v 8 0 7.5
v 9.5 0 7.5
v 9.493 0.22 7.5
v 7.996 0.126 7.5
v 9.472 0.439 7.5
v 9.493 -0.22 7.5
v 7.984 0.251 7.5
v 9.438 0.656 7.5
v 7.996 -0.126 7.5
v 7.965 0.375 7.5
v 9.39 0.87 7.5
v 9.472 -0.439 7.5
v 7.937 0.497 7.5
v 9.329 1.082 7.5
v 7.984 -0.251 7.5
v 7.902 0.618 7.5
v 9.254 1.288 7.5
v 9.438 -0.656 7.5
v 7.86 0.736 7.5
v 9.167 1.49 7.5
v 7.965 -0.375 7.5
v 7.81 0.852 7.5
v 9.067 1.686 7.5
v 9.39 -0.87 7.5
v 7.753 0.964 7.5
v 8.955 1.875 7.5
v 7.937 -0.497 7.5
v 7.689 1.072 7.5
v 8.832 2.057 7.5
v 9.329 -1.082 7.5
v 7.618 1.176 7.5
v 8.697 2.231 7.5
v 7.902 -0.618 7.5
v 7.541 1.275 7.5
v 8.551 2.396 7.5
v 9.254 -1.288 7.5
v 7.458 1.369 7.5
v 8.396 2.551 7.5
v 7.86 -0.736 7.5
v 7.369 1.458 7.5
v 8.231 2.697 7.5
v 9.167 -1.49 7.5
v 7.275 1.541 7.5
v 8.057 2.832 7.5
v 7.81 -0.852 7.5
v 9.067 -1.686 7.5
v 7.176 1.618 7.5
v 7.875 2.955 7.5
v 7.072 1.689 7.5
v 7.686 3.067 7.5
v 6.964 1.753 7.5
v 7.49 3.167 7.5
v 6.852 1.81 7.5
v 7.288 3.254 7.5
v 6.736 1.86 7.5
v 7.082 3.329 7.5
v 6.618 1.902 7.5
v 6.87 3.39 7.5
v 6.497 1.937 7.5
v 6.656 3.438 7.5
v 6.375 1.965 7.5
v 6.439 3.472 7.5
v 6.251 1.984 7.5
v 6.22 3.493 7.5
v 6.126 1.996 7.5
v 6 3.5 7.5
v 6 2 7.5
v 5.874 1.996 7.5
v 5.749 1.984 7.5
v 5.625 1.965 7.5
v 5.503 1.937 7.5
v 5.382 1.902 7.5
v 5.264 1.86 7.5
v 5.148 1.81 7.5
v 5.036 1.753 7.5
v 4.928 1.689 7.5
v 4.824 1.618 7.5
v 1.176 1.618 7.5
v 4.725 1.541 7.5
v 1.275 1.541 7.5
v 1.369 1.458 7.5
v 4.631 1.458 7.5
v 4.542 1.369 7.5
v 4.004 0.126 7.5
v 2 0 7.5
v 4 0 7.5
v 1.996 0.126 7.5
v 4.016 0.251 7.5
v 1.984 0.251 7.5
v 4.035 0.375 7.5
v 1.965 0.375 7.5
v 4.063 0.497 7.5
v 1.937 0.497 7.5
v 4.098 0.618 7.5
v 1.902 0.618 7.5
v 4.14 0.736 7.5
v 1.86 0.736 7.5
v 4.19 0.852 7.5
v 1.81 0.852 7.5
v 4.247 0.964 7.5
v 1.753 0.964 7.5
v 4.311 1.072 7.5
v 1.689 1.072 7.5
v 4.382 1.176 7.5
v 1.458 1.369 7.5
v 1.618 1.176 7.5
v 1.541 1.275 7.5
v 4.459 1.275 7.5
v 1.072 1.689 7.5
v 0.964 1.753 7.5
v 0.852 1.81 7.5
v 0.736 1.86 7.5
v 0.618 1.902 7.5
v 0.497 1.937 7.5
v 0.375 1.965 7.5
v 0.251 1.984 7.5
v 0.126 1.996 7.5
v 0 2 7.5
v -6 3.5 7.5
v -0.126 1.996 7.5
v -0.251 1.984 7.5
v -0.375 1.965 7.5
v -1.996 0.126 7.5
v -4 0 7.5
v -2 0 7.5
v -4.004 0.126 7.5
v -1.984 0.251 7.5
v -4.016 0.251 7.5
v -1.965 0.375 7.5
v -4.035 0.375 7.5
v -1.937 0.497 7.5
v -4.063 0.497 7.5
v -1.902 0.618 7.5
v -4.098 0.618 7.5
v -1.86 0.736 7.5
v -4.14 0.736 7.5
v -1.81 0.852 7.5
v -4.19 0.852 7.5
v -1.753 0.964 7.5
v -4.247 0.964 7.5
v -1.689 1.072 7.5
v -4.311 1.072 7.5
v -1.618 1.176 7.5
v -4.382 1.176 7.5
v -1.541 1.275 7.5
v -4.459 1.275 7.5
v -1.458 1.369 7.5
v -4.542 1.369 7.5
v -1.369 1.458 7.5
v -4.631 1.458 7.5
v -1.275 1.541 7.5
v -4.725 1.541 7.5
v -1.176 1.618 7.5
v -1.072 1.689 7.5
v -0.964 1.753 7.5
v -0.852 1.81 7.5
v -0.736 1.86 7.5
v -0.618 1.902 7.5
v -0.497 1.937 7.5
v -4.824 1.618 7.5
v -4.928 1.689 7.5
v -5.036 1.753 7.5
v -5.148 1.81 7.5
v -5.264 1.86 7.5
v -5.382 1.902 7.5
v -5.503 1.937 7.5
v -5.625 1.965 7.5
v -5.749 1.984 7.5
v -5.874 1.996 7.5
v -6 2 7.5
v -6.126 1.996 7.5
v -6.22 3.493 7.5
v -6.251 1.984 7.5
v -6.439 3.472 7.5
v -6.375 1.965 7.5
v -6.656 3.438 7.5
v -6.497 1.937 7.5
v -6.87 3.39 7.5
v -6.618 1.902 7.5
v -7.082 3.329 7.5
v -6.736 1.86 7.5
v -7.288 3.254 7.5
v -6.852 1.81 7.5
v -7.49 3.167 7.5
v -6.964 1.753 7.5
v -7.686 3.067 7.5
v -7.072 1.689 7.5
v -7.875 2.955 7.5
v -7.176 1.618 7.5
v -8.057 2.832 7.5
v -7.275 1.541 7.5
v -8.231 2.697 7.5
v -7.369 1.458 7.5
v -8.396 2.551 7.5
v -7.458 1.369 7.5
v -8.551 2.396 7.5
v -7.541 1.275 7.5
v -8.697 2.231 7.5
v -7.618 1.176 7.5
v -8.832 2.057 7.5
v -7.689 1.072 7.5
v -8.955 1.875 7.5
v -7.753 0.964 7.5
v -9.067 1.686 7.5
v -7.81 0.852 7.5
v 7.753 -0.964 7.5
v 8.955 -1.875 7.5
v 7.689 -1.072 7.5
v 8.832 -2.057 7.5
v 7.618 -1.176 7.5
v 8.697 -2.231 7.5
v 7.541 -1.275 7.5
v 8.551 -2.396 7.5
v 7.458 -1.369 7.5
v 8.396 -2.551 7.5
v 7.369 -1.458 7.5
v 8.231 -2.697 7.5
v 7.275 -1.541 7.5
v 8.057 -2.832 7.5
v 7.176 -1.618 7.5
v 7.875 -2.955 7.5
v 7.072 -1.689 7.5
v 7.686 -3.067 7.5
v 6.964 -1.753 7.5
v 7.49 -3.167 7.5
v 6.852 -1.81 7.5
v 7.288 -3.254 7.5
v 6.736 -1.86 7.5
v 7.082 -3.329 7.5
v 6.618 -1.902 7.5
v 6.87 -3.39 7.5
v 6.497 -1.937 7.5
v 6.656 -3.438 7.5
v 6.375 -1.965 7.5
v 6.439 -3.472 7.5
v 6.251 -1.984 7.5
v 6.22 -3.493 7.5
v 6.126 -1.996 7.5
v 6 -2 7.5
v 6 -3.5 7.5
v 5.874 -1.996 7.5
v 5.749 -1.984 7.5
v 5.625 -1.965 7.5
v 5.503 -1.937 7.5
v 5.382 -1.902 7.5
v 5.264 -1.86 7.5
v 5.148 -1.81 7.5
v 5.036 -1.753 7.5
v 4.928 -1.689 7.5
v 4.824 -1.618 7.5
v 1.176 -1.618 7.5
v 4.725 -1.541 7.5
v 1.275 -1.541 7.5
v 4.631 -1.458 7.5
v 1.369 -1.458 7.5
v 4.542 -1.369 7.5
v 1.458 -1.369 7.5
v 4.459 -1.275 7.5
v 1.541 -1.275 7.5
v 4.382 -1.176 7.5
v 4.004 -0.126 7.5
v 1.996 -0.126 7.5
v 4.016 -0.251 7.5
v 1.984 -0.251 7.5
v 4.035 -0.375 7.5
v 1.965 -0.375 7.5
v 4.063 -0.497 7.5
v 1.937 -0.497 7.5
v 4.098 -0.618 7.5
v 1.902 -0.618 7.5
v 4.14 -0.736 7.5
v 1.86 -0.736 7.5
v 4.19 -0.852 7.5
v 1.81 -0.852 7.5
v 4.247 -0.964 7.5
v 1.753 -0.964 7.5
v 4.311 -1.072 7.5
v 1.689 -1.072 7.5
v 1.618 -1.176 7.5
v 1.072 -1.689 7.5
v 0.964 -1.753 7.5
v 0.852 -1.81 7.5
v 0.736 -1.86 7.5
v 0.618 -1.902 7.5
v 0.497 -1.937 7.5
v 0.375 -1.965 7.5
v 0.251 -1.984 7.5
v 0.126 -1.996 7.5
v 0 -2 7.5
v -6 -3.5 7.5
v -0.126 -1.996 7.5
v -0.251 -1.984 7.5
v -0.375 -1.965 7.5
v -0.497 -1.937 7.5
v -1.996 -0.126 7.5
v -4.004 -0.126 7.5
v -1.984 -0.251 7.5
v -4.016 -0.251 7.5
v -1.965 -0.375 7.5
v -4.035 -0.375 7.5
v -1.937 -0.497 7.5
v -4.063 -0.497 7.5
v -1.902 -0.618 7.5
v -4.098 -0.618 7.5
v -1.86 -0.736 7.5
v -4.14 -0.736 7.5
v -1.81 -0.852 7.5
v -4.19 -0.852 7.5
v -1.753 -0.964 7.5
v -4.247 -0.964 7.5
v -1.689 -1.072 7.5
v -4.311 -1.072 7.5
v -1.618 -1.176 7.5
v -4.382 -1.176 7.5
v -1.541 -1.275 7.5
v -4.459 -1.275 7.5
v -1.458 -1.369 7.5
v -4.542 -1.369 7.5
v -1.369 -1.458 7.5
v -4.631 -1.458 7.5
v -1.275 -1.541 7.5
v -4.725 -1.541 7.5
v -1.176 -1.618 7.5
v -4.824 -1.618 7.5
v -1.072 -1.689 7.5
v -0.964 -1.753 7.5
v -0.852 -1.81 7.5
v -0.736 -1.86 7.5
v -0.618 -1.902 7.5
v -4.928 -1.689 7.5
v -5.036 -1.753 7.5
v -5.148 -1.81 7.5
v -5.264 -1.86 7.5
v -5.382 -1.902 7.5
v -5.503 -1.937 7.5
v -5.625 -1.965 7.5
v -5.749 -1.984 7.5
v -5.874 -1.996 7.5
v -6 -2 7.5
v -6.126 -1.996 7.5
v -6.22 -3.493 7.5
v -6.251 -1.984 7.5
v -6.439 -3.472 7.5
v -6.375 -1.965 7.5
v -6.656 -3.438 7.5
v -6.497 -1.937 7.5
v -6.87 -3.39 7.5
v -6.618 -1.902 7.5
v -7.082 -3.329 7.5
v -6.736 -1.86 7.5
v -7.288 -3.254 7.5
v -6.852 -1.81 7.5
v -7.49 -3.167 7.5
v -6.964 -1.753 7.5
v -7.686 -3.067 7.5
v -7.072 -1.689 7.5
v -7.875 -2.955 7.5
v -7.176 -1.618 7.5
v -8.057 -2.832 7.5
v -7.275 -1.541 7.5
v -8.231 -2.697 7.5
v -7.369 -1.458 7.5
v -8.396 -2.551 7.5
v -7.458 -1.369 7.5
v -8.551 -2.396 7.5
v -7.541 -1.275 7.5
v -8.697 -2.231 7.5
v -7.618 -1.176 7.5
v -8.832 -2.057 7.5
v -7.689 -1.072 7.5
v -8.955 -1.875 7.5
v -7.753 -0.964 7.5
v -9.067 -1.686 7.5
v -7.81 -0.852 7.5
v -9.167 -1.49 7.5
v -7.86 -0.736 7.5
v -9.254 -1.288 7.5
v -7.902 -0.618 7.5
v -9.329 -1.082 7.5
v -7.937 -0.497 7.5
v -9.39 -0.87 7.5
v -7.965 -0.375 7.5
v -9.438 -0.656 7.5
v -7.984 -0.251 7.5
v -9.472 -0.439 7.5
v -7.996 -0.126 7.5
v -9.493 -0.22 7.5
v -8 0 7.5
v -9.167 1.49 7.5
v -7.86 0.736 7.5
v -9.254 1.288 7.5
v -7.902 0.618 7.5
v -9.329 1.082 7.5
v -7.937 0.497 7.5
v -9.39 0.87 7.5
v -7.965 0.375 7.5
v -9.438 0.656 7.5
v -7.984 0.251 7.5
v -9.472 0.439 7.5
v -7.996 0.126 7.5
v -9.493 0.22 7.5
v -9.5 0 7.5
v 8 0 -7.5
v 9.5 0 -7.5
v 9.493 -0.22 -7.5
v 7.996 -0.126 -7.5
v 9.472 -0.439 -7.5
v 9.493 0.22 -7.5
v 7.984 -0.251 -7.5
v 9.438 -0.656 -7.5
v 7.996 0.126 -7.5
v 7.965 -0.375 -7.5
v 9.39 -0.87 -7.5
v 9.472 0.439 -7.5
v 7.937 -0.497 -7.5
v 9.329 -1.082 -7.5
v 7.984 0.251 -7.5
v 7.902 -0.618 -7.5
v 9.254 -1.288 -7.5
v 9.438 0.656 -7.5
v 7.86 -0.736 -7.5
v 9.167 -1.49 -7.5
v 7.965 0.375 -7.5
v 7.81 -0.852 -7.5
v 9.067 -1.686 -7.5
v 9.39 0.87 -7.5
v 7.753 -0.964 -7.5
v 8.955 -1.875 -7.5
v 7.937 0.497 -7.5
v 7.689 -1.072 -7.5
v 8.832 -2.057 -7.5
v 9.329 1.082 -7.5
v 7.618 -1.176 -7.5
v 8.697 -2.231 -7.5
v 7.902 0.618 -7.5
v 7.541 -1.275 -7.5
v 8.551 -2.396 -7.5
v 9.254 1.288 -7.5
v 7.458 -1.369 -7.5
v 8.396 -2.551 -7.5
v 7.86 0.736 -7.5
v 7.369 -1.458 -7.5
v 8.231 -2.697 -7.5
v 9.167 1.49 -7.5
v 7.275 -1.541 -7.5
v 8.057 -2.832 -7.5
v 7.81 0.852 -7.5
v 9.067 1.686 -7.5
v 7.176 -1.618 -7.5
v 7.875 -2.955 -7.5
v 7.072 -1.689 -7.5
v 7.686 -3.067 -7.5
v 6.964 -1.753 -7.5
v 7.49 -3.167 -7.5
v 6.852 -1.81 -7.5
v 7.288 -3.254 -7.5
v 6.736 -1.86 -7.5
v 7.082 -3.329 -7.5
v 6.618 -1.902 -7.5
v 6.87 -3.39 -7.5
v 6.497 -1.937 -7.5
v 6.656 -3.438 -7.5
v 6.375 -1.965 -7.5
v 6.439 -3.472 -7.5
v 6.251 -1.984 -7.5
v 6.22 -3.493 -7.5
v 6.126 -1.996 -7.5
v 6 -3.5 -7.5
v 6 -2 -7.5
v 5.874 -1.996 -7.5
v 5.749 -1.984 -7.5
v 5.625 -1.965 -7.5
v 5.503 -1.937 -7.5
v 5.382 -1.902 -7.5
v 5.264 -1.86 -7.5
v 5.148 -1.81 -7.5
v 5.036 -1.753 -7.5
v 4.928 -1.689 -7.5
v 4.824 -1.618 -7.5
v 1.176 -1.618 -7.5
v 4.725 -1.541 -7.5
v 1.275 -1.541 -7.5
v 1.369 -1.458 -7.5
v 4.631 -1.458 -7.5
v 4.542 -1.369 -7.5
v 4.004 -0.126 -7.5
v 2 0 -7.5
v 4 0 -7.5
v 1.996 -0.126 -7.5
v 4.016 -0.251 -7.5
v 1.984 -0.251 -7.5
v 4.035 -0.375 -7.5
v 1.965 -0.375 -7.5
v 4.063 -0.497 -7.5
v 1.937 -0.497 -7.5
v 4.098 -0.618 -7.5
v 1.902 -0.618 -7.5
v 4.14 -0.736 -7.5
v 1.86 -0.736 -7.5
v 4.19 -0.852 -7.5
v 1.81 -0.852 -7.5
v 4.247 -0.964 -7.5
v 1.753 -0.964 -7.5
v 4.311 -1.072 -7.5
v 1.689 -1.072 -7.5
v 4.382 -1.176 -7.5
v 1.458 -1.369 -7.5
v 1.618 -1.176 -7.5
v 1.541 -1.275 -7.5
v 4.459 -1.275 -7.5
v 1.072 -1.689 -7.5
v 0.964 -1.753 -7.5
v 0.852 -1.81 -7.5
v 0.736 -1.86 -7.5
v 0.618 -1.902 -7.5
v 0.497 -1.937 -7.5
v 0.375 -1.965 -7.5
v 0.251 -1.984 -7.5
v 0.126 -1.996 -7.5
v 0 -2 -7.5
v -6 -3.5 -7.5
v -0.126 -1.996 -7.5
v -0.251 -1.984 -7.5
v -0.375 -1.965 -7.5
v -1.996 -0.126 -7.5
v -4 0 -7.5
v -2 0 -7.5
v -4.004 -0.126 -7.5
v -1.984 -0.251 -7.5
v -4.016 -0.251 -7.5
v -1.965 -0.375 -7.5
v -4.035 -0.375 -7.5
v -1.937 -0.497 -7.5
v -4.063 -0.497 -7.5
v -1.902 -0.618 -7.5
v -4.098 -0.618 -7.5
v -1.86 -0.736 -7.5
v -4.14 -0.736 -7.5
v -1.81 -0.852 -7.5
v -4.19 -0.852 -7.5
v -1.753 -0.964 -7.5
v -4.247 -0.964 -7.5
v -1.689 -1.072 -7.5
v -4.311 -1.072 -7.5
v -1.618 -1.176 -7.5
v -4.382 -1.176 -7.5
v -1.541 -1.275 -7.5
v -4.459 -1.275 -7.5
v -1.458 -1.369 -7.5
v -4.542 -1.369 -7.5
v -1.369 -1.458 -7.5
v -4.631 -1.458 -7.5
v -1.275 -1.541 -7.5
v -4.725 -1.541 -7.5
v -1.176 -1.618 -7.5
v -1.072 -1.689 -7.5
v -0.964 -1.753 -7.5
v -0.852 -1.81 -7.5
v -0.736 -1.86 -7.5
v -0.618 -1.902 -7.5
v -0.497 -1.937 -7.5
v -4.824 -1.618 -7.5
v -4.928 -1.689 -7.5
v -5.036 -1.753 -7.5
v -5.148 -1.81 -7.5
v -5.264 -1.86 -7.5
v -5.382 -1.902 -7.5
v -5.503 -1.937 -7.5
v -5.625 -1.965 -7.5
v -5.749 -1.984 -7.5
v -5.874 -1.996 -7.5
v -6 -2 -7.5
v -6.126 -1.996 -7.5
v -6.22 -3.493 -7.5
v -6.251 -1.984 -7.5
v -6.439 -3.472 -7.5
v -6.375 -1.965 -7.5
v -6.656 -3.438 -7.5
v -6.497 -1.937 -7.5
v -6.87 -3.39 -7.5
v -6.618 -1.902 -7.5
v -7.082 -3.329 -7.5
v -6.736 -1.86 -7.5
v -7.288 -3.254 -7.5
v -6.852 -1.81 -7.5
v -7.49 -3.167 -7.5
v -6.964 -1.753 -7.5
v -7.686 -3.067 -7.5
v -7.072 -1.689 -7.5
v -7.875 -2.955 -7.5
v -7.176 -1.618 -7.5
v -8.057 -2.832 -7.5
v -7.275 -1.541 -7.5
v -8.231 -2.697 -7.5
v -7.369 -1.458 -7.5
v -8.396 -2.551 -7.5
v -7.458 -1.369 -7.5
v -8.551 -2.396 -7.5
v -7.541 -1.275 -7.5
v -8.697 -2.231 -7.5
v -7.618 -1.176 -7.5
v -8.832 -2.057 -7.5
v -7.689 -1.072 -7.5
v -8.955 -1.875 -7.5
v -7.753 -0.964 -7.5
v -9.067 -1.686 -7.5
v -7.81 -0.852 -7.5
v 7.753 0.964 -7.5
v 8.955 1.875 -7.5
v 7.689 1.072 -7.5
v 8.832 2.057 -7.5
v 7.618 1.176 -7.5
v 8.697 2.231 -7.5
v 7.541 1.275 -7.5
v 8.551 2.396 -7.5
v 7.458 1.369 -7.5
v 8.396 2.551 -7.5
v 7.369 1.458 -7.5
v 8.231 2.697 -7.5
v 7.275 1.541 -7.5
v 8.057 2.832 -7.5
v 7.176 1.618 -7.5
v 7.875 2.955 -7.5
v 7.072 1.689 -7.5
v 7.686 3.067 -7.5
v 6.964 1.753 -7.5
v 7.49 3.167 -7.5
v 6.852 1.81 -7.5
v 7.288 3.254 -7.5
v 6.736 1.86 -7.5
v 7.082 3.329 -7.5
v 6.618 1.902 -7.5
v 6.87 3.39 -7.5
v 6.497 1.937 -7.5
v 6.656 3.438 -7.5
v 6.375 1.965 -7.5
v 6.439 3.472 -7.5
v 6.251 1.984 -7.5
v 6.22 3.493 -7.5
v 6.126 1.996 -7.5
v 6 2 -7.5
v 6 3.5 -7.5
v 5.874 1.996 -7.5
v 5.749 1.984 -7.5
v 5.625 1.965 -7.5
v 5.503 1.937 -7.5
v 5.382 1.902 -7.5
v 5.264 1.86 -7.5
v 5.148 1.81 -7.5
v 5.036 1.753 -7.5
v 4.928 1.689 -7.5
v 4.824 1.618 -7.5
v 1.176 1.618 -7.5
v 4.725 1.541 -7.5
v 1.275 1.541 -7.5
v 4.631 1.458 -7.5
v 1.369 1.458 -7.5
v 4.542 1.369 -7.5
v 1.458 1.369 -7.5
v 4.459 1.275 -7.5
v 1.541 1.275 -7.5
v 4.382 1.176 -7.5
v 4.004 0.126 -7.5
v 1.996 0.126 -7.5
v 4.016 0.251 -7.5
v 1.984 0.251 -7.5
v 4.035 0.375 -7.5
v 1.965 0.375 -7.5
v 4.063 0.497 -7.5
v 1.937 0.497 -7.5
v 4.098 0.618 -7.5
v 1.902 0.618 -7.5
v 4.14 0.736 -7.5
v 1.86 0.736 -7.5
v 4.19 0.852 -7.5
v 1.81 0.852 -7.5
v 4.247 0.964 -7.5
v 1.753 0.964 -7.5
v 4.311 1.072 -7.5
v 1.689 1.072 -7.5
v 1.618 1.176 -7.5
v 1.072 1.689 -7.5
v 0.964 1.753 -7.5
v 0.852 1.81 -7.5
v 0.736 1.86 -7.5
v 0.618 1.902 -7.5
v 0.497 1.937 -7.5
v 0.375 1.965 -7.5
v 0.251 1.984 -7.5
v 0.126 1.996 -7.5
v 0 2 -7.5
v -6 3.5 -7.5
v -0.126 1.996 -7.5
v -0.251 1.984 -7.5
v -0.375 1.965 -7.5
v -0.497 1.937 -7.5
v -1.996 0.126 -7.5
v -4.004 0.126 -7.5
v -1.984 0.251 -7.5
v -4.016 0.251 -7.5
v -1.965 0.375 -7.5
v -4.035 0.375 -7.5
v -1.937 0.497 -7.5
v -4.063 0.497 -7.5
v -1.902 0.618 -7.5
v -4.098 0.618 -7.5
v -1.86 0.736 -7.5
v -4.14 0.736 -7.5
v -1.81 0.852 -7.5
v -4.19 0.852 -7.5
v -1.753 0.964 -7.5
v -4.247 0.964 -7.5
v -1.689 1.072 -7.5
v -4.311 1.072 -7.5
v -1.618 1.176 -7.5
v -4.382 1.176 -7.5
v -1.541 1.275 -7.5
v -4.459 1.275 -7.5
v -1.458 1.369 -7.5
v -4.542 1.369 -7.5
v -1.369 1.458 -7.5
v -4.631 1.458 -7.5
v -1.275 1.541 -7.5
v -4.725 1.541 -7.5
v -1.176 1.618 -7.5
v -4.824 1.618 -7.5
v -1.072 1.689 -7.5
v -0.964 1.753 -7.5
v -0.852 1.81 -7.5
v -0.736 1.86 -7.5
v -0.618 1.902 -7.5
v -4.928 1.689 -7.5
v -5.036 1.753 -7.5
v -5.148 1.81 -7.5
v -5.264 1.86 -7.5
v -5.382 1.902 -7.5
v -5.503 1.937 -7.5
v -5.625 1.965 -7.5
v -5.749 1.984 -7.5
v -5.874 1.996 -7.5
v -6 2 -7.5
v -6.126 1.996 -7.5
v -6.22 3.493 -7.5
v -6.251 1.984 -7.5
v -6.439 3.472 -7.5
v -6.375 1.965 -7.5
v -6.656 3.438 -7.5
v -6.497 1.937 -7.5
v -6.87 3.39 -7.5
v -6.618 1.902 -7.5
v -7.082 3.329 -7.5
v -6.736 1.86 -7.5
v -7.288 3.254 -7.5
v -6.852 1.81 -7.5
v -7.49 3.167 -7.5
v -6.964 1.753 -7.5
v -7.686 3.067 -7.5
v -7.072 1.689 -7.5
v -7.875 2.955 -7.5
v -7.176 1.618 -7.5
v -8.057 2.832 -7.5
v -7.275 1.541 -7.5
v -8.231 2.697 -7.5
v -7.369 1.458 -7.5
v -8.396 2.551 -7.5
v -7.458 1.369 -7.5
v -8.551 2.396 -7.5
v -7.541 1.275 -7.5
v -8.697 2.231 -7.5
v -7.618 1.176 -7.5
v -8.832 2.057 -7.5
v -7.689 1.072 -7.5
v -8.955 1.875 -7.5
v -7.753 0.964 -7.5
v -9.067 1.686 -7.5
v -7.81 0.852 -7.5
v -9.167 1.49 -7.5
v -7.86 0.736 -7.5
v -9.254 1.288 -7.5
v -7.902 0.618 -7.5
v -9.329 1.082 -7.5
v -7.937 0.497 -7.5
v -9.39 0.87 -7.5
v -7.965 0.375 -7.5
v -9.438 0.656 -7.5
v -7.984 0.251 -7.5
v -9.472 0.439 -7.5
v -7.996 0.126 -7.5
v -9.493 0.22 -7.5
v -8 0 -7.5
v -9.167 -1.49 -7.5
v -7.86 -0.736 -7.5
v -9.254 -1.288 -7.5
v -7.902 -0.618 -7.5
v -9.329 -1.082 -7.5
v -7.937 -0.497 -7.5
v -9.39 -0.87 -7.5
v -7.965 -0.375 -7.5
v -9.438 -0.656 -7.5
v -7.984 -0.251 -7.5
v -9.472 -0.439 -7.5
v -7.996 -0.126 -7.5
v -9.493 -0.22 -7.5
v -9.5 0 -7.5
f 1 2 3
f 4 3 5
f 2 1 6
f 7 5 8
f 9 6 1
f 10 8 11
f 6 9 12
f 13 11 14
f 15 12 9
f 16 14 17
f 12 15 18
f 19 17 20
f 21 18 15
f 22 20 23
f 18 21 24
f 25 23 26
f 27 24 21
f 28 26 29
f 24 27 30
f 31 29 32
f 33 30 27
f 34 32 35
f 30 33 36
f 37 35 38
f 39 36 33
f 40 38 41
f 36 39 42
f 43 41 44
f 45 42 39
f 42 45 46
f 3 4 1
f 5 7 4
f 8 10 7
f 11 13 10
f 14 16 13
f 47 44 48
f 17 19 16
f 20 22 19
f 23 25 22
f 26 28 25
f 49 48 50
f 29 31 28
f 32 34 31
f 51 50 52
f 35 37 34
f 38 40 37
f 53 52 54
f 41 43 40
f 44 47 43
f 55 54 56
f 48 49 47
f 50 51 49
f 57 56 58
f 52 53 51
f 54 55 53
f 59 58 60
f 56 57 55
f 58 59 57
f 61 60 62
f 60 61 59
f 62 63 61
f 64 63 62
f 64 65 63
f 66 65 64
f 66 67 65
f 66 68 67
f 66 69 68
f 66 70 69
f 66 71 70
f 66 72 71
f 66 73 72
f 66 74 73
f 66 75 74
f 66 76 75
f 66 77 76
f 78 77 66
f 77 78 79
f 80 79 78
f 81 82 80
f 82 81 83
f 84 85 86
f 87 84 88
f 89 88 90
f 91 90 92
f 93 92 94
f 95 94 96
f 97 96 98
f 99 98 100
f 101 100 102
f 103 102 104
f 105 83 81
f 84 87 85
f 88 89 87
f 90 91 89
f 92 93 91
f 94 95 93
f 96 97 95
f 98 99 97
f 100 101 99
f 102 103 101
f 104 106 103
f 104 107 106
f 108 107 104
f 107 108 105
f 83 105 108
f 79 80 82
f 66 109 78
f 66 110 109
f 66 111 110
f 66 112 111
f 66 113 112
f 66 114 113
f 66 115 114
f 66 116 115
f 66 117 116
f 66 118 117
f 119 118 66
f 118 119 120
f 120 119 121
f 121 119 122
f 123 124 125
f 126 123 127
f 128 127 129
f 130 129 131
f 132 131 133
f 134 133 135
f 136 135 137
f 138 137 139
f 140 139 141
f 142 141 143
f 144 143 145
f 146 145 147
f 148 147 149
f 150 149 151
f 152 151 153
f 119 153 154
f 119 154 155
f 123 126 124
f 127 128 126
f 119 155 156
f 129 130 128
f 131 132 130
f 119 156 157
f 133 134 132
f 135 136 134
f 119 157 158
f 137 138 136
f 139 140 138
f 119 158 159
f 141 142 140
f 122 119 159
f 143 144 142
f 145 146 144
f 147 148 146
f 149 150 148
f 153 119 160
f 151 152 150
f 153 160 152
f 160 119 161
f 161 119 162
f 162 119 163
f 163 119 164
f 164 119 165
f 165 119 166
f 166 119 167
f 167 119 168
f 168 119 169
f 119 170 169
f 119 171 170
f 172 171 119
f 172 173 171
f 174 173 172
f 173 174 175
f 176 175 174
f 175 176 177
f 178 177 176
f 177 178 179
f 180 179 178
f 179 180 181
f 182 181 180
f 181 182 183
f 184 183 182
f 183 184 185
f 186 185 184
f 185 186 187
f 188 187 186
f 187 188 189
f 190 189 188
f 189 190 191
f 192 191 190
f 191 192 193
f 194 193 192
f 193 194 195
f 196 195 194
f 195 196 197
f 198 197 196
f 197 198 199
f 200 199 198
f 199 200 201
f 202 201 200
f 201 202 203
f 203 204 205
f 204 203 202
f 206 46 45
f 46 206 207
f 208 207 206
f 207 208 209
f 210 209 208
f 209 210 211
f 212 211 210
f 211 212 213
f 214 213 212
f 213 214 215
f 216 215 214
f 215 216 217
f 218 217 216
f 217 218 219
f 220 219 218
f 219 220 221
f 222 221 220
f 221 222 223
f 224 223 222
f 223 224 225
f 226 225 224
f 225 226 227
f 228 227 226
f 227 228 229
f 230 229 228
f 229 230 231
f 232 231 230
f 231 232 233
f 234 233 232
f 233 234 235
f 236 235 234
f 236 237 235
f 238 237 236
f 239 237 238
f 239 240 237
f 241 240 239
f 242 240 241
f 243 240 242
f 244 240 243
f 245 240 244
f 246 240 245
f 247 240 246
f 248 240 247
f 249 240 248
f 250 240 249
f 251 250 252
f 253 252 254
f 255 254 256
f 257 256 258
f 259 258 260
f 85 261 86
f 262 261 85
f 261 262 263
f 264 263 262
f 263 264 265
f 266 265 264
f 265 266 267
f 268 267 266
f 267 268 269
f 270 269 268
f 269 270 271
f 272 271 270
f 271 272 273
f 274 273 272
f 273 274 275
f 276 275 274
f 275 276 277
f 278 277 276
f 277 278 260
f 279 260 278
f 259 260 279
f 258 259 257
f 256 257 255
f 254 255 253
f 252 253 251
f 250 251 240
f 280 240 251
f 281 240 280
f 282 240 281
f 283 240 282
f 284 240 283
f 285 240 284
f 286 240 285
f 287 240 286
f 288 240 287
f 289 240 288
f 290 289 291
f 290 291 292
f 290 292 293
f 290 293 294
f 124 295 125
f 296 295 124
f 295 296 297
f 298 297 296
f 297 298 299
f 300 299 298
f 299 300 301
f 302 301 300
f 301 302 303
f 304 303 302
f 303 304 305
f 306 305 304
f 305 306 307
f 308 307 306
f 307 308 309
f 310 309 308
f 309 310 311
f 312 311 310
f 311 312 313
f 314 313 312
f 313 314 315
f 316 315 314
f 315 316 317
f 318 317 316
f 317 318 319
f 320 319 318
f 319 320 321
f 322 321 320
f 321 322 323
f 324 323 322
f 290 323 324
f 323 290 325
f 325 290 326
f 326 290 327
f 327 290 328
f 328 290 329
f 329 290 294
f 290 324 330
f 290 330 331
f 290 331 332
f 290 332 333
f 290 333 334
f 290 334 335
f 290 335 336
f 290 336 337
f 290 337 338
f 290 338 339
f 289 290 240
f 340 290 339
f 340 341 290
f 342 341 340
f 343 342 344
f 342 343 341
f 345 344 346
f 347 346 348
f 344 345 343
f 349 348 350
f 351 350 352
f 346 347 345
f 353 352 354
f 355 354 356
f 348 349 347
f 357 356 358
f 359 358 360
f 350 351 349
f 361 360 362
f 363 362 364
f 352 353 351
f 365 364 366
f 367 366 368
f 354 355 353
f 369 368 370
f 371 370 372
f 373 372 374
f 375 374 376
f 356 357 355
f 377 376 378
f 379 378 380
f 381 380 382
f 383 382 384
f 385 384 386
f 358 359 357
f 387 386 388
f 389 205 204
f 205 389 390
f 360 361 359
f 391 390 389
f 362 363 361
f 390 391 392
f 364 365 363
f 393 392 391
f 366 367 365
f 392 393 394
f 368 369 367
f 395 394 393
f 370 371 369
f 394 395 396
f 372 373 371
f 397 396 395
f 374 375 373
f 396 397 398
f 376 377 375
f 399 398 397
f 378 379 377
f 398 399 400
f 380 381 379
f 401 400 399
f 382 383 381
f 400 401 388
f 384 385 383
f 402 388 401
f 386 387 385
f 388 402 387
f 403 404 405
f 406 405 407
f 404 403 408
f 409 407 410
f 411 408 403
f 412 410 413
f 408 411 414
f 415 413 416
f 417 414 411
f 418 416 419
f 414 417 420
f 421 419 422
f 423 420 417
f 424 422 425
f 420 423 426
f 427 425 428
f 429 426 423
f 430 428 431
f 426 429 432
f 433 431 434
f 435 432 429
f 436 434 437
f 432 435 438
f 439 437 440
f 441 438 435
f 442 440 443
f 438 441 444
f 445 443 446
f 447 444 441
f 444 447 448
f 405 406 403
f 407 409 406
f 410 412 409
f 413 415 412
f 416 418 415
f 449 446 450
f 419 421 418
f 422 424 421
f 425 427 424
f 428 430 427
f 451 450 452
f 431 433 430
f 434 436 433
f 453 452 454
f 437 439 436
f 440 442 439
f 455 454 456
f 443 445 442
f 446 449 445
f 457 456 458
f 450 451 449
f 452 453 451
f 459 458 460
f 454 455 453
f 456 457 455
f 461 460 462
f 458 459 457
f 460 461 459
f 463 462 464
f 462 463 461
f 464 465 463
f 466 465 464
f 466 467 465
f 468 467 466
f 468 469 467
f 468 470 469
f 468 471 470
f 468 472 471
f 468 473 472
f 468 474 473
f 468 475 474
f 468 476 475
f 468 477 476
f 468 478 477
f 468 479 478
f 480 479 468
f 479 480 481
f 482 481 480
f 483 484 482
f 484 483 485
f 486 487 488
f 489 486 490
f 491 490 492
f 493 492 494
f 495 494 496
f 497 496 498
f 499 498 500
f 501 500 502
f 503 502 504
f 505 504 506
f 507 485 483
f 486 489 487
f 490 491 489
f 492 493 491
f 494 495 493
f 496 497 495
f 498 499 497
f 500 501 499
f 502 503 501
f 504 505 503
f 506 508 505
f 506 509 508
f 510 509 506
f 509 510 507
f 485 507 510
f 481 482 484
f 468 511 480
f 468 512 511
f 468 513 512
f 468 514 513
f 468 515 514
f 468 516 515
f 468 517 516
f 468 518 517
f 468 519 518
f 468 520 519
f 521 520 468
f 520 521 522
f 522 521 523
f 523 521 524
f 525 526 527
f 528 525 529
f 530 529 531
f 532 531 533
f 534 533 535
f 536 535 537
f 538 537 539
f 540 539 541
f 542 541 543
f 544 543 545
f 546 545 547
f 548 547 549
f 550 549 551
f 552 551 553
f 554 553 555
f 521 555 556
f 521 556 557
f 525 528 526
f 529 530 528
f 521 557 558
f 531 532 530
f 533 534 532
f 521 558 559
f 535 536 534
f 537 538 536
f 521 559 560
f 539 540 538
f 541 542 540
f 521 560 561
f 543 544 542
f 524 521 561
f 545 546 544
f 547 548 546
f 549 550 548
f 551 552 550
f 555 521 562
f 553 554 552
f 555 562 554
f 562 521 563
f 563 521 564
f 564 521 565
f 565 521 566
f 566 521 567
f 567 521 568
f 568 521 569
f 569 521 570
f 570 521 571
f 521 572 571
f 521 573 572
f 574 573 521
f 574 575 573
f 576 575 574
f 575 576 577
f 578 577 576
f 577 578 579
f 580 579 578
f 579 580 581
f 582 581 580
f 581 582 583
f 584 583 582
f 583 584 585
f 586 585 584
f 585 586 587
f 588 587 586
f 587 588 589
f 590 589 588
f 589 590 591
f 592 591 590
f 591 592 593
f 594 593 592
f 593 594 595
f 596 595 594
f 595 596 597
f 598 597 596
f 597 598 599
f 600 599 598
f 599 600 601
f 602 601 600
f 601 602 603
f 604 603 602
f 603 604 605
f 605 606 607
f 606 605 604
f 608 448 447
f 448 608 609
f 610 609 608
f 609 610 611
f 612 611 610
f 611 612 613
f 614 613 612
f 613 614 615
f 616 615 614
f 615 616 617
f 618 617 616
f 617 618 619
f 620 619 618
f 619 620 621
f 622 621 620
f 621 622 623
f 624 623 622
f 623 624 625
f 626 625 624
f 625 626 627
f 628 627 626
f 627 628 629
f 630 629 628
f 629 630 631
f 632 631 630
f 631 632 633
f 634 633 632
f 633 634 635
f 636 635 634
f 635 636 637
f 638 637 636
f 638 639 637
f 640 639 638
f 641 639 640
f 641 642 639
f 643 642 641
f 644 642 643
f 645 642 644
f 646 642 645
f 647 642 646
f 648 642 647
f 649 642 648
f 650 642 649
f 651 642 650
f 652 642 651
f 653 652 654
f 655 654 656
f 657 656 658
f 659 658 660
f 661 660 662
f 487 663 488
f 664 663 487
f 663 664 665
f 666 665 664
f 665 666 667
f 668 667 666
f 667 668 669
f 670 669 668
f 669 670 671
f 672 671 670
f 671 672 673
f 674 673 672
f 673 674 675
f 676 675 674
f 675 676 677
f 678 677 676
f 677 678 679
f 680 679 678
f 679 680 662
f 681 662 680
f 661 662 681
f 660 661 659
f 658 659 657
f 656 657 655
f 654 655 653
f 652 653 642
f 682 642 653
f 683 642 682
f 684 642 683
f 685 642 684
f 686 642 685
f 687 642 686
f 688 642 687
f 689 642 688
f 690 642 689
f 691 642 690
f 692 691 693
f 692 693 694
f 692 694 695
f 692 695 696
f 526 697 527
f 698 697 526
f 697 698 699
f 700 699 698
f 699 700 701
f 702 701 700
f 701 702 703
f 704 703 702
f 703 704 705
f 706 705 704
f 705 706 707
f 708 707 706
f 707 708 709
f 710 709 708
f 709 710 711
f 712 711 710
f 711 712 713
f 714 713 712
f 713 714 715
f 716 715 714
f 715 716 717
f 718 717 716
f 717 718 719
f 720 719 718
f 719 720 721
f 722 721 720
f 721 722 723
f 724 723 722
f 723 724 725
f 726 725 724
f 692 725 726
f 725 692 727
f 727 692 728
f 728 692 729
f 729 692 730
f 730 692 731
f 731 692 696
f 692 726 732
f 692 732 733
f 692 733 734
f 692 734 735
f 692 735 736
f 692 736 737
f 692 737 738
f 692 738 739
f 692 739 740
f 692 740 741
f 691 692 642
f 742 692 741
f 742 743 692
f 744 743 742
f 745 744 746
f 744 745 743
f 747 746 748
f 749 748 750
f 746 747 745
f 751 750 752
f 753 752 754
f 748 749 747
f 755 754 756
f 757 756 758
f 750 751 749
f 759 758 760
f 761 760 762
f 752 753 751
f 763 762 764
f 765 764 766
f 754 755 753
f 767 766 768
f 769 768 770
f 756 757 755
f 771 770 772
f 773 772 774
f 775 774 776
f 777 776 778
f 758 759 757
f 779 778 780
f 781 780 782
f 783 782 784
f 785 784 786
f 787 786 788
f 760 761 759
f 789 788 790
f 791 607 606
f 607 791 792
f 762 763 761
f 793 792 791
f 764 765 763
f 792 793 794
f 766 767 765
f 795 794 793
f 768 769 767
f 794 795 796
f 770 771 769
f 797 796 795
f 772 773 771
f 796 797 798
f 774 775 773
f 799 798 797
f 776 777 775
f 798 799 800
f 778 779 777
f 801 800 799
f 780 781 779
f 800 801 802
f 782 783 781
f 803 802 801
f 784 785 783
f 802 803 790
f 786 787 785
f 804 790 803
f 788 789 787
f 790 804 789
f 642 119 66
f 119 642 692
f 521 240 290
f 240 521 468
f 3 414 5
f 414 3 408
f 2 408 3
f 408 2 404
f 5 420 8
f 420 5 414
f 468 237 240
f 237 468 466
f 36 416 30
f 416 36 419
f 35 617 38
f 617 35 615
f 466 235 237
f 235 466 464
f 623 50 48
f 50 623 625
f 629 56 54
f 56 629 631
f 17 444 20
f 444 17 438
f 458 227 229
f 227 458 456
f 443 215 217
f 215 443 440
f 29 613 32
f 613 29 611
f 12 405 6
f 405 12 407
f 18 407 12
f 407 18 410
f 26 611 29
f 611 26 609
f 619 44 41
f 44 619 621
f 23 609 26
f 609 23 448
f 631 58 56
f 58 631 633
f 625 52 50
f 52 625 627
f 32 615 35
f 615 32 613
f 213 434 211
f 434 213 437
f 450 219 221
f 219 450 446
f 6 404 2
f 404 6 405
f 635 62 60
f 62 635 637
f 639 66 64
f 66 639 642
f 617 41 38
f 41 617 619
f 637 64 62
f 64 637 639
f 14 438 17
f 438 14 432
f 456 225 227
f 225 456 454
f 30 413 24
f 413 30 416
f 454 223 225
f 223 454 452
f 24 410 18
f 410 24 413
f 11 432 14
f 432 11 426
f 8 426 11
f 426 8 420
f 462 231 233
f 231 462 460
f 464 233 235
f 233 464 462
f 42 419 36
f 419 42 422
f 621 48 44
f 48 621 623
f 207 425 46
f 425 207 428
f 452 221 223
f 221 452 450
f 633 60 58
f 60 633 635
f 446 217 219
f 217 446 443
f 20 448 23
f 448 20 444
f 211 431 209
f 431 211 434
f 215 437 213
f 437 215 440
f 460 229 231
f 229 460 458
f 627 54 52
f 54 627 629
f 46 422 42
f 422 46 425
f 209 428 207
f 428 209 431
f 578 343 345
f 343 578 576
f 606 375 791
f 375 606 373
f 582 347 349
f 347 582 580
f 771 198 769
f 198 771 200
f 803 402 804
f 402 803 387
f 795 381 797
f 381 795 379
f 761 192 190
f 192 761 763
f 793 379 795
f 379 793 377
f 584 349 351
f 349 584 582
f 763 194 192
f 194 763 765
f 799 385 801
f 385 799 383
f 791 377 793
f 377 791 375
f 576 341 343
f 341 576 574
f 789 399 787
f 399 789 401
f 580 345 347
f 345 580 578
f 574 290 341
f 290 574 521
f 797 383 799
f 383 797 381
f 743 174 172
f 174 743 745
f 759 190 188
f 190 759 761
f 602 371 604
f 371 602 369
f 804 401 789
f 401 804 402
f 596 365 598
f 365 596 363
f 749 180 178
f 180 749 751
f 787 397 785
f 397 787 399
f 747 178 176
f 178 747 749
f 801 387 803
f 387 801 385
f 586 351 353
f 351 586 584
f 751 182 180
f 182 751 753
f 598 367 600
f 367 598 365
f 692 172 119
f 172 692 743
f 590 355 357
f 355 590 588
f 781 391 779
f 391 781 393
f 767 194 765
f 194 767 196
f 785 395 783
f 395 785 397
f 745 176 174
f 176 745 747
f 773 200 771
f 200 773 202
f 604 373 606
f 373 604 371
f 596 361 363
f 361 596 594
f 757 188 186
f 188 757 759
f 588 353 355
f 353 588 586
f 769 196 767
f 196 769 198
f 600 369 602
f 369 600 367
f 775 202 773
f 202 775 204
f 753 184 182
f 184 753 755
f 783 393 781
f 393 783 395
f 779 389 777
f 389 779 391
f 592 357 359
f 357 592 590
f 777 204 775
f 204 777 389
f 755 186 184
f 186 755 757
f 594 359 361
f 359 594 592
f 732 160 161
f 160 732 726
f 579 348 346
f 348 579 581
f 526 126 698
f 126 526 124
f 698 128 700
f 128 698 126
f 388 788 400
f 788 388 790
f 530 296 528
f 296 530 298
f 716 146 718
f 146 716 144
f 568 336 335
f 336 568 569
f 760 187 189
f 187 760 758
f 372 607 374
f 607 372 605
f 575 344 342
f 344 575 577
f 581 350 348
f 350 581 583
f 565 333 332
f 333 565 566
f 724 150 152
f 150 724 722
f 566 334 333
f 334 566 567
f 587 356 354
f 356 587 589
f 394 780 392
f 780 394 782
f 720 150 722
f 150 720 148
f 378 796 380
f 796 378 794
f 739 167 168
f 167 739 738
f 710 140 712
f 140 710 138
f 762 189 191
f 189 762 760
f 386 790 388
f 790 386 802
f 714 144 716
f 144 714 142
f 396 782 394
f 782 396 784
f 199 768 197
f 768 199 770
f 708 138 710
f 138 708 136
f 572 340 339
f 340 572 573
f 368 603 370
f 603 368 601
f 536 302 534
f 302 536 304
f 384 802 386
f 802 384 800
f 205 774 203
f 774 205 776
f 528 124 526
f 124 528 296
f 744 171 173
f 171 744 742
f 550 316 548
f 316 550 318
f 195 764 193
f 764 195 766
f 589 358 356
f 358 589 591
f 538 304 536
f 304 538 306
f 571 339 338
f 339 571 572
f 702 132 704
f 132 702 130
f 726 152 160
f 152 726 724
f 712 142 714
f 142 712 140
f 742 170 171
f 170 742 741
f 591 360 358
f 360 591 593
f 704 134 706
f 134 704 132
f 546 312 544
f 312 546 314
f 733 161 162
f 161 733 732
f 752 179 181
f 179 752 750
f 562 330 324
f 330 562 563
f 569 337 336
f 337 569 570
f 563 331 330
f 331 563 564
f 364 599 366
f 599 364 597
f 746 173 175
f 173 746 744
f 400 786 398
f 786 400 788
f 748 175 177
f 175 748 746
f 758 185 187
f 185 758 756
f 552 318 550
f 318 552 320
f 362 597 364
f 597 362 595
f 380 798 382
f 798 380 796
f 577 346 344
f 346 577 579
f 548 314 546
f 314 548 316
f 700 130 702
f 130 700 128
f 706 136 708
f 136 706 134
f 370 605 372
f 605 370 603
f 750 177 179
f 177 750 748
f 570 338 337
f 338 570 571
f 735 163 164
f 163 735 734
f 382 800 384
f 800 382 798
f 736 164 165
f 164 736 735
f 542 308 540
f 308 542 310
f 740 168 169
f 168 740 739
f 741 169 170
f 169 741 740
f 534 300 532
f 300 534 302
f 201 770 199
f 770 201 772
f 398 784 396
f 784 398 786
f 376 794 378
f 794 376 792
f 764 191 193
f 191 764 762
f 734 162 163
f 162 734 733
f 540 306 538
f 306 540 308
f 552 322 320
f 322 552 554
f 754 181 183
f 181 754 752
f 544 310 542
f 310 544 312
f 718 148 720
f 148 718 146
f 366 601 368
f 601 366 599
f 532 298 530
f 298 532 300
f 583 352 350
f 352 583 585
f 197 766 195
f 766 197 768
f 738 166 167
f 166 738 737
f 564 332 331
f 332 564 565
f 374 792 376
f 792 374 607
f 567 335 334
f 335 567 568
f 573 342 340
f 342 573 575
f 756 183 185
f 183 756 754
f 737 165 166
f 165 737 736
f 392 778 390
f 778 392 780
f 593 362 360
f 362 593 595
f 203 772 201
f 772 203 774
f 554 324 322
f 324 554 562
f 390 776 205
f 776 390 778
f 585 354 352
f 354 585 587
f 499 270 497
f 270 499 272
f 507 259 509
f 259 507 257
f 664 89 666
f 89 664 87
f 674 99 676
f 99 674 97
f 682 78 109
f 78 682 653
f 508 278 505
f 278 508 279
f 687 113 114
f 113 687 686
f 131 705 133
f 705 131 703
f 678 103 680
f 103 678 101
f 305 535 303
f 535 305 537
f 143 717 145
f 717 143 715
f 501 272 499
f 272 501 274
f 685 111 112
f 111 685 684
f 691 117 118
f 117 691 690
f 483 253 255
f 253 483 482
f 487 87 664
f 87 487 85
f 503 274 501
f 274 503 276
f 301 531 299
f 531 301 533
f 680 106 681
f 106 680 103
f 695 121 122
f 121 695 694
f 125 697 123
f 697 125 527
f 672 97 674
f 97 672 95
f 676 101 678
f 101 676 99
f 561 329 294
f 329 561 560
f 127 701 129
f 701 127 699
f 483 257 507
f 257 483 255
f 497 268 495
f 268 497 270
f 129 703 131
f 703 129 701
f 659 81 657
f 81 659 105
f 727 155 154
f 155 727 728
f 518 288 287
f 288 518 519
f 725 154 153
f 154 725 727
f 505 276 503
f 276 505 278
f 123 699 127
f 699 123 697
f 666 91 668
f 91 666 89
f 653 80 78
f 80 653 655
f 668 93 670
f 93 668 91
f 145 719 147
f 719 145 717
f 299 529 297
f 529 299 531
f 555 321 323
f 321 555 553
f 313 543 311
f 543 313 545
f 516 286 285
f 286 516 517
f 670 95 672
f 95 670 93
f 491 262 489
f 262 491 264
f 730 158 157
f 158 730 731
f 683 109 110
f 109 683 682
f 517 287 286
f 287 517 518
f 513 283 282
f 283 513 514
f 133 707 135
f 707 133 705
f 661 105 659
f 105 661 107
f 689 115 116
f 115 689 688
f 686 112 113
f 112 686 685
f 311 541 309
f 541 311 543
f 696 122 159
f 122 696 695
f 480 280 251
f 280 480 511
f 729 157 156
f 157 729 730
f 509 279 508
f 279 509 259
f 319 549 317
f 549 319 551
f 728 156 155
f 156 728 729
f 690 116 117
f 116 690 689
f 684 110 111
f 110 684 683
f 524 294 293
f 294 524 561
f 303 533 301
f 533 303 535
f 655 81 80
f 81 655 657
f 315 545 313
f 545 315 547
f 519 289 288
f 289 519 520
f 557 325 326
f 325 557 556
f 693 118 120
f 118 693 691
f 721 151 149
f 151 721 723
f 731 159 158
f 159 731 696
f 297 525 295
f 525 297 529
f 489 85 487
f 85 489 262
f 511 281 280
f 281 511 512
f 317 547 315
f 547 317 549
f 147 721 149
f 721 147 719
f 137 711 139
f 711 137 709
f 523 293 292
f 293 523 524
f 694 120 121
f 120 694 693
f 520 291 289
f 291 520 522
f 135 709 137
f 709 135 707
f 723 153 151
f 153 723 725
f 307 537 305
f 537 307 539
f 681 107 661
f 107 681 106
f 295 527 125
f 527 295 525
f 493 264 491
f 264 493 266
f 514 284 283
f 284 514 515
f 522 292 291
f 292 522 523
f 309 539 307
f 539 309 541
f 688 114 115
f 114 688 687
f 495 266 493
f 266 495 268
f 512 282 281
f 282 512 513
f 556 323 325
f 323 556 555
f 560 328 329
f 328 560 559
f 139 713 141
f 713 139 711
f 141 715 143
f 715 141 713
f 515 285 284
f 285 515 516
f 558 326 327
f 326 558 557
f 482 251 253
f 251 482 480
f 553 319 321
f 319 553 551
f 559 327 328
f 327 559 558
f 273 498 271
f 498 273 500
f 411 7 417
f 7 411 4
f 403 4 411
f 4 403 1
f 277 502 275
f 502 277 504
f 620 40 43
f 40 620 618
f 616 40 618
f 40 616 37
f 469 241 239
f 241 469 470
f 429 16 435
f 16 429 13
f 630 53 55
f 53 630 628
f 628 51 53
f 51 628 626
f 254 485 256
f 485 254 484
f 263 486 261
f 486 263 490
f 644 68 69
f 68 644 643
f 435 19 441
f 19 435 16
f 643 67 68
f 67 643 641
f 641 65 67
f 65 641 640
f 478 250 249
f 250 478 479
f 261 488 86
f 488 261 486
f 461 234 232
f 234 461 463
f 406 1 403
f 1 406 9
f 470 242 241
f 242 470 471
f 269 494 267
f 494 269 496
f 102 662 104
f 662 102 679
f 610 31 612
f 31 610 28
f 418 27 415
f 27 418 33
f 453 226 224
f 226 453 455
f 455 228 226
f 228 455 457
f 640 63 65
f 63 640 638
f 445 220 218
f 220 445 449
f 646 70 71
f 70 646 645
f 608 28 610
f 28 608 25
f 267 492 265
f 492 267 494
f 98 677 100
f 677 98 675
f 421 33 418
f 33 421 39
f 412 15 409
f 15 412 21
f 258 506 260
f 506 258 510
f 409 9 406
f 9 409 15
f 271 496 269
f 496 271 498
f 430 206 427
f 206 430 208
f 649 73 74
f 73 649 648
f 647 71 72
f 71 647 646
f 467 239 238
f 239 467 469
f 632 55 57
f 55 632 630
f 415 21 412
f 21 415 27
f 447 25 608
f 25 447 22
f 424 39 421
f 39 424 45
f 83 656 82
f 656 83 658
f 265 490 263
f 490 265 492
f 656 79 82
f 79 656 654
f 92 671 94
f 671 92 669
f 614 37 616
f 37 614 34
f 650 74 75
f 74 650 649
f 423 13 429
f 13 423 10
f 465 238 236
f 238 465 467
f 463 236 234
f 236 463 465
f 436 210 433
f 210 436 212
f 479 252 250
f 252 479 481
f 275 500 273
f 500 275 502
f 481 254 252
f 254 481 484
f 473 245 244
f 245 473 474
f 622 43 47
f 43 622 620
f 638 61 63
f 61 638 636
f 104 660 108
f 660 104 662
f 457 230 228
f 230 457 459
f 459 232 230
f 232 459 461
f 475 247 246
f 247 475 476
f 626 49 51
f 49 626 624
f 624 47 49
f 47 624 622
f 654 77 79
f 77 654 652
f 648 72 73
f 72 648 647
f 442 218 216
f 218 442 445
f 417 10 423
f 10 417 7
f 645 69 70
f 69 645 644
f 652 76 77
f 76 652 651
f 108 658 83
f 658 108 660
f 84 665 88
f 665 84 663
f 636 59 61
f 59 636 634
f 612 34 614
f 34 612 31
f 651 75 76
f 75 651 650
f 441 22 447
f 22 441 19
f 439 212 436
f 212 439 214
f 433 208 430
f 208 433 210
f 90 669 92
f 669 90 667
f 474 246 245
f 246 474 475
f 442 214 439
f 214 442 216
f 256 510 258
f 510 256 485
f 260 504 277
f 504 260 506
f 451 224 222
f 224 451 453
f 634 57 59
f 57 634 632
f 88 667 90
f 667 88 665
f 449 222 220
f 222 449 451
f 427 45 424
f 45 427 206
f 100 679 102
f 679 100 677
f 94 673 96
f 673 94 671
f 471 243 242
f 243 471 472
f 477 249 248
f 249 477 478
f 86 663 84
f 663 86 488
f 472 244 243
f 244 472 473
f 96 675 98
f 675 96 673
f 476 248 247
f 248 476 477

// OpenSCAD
$fn=100;

InnerDiameter = 3.0;
InnerDiameterExpansion = 1.0;
WallThickness = 1.5;
Height = 15;
LedSpacing = 6;
LedNum = 3;


difference()
{
    union()
    {
        cube([LedSpacing * (LedNum - 1), InnerDiameter+InnerDiameterExpansion+WallThickness*2, Height], center = true);
        
        translate([LedSpacing * (LedNum - 1)/2, 0, 0])
        {
            cylinder(Height, (InnerDiameter+InnerDiameterExpansion+WallThickness*2)/2, (InnerDiameter+InnerDiameterExpansion+WallThickness*2)/2, center = true);
        }
        
        translate([-LedSpacing * (LedNum - 1)/2, 0, 0])
        {
            cylinder(Height, (InnerDiameter+InnerDiameterExpansion+WallThickness*2)/2, (InnerDiameter+InnerDiameterExpansion+WallThickness*2)/2, center = true);
        }
    }
    
    for(i = [0 : LedNum])
    {
        translate([-LedSpacing * (LedNum - 1)/2 + LedSpacing * i, 0, 0])
        {
            cylinder(Height, (InnerDiameter+InnerDiameterExpansion)/2, (InnerDiameter+InnerDiameterExpansion)/2, center = true);
        }
    }
}
